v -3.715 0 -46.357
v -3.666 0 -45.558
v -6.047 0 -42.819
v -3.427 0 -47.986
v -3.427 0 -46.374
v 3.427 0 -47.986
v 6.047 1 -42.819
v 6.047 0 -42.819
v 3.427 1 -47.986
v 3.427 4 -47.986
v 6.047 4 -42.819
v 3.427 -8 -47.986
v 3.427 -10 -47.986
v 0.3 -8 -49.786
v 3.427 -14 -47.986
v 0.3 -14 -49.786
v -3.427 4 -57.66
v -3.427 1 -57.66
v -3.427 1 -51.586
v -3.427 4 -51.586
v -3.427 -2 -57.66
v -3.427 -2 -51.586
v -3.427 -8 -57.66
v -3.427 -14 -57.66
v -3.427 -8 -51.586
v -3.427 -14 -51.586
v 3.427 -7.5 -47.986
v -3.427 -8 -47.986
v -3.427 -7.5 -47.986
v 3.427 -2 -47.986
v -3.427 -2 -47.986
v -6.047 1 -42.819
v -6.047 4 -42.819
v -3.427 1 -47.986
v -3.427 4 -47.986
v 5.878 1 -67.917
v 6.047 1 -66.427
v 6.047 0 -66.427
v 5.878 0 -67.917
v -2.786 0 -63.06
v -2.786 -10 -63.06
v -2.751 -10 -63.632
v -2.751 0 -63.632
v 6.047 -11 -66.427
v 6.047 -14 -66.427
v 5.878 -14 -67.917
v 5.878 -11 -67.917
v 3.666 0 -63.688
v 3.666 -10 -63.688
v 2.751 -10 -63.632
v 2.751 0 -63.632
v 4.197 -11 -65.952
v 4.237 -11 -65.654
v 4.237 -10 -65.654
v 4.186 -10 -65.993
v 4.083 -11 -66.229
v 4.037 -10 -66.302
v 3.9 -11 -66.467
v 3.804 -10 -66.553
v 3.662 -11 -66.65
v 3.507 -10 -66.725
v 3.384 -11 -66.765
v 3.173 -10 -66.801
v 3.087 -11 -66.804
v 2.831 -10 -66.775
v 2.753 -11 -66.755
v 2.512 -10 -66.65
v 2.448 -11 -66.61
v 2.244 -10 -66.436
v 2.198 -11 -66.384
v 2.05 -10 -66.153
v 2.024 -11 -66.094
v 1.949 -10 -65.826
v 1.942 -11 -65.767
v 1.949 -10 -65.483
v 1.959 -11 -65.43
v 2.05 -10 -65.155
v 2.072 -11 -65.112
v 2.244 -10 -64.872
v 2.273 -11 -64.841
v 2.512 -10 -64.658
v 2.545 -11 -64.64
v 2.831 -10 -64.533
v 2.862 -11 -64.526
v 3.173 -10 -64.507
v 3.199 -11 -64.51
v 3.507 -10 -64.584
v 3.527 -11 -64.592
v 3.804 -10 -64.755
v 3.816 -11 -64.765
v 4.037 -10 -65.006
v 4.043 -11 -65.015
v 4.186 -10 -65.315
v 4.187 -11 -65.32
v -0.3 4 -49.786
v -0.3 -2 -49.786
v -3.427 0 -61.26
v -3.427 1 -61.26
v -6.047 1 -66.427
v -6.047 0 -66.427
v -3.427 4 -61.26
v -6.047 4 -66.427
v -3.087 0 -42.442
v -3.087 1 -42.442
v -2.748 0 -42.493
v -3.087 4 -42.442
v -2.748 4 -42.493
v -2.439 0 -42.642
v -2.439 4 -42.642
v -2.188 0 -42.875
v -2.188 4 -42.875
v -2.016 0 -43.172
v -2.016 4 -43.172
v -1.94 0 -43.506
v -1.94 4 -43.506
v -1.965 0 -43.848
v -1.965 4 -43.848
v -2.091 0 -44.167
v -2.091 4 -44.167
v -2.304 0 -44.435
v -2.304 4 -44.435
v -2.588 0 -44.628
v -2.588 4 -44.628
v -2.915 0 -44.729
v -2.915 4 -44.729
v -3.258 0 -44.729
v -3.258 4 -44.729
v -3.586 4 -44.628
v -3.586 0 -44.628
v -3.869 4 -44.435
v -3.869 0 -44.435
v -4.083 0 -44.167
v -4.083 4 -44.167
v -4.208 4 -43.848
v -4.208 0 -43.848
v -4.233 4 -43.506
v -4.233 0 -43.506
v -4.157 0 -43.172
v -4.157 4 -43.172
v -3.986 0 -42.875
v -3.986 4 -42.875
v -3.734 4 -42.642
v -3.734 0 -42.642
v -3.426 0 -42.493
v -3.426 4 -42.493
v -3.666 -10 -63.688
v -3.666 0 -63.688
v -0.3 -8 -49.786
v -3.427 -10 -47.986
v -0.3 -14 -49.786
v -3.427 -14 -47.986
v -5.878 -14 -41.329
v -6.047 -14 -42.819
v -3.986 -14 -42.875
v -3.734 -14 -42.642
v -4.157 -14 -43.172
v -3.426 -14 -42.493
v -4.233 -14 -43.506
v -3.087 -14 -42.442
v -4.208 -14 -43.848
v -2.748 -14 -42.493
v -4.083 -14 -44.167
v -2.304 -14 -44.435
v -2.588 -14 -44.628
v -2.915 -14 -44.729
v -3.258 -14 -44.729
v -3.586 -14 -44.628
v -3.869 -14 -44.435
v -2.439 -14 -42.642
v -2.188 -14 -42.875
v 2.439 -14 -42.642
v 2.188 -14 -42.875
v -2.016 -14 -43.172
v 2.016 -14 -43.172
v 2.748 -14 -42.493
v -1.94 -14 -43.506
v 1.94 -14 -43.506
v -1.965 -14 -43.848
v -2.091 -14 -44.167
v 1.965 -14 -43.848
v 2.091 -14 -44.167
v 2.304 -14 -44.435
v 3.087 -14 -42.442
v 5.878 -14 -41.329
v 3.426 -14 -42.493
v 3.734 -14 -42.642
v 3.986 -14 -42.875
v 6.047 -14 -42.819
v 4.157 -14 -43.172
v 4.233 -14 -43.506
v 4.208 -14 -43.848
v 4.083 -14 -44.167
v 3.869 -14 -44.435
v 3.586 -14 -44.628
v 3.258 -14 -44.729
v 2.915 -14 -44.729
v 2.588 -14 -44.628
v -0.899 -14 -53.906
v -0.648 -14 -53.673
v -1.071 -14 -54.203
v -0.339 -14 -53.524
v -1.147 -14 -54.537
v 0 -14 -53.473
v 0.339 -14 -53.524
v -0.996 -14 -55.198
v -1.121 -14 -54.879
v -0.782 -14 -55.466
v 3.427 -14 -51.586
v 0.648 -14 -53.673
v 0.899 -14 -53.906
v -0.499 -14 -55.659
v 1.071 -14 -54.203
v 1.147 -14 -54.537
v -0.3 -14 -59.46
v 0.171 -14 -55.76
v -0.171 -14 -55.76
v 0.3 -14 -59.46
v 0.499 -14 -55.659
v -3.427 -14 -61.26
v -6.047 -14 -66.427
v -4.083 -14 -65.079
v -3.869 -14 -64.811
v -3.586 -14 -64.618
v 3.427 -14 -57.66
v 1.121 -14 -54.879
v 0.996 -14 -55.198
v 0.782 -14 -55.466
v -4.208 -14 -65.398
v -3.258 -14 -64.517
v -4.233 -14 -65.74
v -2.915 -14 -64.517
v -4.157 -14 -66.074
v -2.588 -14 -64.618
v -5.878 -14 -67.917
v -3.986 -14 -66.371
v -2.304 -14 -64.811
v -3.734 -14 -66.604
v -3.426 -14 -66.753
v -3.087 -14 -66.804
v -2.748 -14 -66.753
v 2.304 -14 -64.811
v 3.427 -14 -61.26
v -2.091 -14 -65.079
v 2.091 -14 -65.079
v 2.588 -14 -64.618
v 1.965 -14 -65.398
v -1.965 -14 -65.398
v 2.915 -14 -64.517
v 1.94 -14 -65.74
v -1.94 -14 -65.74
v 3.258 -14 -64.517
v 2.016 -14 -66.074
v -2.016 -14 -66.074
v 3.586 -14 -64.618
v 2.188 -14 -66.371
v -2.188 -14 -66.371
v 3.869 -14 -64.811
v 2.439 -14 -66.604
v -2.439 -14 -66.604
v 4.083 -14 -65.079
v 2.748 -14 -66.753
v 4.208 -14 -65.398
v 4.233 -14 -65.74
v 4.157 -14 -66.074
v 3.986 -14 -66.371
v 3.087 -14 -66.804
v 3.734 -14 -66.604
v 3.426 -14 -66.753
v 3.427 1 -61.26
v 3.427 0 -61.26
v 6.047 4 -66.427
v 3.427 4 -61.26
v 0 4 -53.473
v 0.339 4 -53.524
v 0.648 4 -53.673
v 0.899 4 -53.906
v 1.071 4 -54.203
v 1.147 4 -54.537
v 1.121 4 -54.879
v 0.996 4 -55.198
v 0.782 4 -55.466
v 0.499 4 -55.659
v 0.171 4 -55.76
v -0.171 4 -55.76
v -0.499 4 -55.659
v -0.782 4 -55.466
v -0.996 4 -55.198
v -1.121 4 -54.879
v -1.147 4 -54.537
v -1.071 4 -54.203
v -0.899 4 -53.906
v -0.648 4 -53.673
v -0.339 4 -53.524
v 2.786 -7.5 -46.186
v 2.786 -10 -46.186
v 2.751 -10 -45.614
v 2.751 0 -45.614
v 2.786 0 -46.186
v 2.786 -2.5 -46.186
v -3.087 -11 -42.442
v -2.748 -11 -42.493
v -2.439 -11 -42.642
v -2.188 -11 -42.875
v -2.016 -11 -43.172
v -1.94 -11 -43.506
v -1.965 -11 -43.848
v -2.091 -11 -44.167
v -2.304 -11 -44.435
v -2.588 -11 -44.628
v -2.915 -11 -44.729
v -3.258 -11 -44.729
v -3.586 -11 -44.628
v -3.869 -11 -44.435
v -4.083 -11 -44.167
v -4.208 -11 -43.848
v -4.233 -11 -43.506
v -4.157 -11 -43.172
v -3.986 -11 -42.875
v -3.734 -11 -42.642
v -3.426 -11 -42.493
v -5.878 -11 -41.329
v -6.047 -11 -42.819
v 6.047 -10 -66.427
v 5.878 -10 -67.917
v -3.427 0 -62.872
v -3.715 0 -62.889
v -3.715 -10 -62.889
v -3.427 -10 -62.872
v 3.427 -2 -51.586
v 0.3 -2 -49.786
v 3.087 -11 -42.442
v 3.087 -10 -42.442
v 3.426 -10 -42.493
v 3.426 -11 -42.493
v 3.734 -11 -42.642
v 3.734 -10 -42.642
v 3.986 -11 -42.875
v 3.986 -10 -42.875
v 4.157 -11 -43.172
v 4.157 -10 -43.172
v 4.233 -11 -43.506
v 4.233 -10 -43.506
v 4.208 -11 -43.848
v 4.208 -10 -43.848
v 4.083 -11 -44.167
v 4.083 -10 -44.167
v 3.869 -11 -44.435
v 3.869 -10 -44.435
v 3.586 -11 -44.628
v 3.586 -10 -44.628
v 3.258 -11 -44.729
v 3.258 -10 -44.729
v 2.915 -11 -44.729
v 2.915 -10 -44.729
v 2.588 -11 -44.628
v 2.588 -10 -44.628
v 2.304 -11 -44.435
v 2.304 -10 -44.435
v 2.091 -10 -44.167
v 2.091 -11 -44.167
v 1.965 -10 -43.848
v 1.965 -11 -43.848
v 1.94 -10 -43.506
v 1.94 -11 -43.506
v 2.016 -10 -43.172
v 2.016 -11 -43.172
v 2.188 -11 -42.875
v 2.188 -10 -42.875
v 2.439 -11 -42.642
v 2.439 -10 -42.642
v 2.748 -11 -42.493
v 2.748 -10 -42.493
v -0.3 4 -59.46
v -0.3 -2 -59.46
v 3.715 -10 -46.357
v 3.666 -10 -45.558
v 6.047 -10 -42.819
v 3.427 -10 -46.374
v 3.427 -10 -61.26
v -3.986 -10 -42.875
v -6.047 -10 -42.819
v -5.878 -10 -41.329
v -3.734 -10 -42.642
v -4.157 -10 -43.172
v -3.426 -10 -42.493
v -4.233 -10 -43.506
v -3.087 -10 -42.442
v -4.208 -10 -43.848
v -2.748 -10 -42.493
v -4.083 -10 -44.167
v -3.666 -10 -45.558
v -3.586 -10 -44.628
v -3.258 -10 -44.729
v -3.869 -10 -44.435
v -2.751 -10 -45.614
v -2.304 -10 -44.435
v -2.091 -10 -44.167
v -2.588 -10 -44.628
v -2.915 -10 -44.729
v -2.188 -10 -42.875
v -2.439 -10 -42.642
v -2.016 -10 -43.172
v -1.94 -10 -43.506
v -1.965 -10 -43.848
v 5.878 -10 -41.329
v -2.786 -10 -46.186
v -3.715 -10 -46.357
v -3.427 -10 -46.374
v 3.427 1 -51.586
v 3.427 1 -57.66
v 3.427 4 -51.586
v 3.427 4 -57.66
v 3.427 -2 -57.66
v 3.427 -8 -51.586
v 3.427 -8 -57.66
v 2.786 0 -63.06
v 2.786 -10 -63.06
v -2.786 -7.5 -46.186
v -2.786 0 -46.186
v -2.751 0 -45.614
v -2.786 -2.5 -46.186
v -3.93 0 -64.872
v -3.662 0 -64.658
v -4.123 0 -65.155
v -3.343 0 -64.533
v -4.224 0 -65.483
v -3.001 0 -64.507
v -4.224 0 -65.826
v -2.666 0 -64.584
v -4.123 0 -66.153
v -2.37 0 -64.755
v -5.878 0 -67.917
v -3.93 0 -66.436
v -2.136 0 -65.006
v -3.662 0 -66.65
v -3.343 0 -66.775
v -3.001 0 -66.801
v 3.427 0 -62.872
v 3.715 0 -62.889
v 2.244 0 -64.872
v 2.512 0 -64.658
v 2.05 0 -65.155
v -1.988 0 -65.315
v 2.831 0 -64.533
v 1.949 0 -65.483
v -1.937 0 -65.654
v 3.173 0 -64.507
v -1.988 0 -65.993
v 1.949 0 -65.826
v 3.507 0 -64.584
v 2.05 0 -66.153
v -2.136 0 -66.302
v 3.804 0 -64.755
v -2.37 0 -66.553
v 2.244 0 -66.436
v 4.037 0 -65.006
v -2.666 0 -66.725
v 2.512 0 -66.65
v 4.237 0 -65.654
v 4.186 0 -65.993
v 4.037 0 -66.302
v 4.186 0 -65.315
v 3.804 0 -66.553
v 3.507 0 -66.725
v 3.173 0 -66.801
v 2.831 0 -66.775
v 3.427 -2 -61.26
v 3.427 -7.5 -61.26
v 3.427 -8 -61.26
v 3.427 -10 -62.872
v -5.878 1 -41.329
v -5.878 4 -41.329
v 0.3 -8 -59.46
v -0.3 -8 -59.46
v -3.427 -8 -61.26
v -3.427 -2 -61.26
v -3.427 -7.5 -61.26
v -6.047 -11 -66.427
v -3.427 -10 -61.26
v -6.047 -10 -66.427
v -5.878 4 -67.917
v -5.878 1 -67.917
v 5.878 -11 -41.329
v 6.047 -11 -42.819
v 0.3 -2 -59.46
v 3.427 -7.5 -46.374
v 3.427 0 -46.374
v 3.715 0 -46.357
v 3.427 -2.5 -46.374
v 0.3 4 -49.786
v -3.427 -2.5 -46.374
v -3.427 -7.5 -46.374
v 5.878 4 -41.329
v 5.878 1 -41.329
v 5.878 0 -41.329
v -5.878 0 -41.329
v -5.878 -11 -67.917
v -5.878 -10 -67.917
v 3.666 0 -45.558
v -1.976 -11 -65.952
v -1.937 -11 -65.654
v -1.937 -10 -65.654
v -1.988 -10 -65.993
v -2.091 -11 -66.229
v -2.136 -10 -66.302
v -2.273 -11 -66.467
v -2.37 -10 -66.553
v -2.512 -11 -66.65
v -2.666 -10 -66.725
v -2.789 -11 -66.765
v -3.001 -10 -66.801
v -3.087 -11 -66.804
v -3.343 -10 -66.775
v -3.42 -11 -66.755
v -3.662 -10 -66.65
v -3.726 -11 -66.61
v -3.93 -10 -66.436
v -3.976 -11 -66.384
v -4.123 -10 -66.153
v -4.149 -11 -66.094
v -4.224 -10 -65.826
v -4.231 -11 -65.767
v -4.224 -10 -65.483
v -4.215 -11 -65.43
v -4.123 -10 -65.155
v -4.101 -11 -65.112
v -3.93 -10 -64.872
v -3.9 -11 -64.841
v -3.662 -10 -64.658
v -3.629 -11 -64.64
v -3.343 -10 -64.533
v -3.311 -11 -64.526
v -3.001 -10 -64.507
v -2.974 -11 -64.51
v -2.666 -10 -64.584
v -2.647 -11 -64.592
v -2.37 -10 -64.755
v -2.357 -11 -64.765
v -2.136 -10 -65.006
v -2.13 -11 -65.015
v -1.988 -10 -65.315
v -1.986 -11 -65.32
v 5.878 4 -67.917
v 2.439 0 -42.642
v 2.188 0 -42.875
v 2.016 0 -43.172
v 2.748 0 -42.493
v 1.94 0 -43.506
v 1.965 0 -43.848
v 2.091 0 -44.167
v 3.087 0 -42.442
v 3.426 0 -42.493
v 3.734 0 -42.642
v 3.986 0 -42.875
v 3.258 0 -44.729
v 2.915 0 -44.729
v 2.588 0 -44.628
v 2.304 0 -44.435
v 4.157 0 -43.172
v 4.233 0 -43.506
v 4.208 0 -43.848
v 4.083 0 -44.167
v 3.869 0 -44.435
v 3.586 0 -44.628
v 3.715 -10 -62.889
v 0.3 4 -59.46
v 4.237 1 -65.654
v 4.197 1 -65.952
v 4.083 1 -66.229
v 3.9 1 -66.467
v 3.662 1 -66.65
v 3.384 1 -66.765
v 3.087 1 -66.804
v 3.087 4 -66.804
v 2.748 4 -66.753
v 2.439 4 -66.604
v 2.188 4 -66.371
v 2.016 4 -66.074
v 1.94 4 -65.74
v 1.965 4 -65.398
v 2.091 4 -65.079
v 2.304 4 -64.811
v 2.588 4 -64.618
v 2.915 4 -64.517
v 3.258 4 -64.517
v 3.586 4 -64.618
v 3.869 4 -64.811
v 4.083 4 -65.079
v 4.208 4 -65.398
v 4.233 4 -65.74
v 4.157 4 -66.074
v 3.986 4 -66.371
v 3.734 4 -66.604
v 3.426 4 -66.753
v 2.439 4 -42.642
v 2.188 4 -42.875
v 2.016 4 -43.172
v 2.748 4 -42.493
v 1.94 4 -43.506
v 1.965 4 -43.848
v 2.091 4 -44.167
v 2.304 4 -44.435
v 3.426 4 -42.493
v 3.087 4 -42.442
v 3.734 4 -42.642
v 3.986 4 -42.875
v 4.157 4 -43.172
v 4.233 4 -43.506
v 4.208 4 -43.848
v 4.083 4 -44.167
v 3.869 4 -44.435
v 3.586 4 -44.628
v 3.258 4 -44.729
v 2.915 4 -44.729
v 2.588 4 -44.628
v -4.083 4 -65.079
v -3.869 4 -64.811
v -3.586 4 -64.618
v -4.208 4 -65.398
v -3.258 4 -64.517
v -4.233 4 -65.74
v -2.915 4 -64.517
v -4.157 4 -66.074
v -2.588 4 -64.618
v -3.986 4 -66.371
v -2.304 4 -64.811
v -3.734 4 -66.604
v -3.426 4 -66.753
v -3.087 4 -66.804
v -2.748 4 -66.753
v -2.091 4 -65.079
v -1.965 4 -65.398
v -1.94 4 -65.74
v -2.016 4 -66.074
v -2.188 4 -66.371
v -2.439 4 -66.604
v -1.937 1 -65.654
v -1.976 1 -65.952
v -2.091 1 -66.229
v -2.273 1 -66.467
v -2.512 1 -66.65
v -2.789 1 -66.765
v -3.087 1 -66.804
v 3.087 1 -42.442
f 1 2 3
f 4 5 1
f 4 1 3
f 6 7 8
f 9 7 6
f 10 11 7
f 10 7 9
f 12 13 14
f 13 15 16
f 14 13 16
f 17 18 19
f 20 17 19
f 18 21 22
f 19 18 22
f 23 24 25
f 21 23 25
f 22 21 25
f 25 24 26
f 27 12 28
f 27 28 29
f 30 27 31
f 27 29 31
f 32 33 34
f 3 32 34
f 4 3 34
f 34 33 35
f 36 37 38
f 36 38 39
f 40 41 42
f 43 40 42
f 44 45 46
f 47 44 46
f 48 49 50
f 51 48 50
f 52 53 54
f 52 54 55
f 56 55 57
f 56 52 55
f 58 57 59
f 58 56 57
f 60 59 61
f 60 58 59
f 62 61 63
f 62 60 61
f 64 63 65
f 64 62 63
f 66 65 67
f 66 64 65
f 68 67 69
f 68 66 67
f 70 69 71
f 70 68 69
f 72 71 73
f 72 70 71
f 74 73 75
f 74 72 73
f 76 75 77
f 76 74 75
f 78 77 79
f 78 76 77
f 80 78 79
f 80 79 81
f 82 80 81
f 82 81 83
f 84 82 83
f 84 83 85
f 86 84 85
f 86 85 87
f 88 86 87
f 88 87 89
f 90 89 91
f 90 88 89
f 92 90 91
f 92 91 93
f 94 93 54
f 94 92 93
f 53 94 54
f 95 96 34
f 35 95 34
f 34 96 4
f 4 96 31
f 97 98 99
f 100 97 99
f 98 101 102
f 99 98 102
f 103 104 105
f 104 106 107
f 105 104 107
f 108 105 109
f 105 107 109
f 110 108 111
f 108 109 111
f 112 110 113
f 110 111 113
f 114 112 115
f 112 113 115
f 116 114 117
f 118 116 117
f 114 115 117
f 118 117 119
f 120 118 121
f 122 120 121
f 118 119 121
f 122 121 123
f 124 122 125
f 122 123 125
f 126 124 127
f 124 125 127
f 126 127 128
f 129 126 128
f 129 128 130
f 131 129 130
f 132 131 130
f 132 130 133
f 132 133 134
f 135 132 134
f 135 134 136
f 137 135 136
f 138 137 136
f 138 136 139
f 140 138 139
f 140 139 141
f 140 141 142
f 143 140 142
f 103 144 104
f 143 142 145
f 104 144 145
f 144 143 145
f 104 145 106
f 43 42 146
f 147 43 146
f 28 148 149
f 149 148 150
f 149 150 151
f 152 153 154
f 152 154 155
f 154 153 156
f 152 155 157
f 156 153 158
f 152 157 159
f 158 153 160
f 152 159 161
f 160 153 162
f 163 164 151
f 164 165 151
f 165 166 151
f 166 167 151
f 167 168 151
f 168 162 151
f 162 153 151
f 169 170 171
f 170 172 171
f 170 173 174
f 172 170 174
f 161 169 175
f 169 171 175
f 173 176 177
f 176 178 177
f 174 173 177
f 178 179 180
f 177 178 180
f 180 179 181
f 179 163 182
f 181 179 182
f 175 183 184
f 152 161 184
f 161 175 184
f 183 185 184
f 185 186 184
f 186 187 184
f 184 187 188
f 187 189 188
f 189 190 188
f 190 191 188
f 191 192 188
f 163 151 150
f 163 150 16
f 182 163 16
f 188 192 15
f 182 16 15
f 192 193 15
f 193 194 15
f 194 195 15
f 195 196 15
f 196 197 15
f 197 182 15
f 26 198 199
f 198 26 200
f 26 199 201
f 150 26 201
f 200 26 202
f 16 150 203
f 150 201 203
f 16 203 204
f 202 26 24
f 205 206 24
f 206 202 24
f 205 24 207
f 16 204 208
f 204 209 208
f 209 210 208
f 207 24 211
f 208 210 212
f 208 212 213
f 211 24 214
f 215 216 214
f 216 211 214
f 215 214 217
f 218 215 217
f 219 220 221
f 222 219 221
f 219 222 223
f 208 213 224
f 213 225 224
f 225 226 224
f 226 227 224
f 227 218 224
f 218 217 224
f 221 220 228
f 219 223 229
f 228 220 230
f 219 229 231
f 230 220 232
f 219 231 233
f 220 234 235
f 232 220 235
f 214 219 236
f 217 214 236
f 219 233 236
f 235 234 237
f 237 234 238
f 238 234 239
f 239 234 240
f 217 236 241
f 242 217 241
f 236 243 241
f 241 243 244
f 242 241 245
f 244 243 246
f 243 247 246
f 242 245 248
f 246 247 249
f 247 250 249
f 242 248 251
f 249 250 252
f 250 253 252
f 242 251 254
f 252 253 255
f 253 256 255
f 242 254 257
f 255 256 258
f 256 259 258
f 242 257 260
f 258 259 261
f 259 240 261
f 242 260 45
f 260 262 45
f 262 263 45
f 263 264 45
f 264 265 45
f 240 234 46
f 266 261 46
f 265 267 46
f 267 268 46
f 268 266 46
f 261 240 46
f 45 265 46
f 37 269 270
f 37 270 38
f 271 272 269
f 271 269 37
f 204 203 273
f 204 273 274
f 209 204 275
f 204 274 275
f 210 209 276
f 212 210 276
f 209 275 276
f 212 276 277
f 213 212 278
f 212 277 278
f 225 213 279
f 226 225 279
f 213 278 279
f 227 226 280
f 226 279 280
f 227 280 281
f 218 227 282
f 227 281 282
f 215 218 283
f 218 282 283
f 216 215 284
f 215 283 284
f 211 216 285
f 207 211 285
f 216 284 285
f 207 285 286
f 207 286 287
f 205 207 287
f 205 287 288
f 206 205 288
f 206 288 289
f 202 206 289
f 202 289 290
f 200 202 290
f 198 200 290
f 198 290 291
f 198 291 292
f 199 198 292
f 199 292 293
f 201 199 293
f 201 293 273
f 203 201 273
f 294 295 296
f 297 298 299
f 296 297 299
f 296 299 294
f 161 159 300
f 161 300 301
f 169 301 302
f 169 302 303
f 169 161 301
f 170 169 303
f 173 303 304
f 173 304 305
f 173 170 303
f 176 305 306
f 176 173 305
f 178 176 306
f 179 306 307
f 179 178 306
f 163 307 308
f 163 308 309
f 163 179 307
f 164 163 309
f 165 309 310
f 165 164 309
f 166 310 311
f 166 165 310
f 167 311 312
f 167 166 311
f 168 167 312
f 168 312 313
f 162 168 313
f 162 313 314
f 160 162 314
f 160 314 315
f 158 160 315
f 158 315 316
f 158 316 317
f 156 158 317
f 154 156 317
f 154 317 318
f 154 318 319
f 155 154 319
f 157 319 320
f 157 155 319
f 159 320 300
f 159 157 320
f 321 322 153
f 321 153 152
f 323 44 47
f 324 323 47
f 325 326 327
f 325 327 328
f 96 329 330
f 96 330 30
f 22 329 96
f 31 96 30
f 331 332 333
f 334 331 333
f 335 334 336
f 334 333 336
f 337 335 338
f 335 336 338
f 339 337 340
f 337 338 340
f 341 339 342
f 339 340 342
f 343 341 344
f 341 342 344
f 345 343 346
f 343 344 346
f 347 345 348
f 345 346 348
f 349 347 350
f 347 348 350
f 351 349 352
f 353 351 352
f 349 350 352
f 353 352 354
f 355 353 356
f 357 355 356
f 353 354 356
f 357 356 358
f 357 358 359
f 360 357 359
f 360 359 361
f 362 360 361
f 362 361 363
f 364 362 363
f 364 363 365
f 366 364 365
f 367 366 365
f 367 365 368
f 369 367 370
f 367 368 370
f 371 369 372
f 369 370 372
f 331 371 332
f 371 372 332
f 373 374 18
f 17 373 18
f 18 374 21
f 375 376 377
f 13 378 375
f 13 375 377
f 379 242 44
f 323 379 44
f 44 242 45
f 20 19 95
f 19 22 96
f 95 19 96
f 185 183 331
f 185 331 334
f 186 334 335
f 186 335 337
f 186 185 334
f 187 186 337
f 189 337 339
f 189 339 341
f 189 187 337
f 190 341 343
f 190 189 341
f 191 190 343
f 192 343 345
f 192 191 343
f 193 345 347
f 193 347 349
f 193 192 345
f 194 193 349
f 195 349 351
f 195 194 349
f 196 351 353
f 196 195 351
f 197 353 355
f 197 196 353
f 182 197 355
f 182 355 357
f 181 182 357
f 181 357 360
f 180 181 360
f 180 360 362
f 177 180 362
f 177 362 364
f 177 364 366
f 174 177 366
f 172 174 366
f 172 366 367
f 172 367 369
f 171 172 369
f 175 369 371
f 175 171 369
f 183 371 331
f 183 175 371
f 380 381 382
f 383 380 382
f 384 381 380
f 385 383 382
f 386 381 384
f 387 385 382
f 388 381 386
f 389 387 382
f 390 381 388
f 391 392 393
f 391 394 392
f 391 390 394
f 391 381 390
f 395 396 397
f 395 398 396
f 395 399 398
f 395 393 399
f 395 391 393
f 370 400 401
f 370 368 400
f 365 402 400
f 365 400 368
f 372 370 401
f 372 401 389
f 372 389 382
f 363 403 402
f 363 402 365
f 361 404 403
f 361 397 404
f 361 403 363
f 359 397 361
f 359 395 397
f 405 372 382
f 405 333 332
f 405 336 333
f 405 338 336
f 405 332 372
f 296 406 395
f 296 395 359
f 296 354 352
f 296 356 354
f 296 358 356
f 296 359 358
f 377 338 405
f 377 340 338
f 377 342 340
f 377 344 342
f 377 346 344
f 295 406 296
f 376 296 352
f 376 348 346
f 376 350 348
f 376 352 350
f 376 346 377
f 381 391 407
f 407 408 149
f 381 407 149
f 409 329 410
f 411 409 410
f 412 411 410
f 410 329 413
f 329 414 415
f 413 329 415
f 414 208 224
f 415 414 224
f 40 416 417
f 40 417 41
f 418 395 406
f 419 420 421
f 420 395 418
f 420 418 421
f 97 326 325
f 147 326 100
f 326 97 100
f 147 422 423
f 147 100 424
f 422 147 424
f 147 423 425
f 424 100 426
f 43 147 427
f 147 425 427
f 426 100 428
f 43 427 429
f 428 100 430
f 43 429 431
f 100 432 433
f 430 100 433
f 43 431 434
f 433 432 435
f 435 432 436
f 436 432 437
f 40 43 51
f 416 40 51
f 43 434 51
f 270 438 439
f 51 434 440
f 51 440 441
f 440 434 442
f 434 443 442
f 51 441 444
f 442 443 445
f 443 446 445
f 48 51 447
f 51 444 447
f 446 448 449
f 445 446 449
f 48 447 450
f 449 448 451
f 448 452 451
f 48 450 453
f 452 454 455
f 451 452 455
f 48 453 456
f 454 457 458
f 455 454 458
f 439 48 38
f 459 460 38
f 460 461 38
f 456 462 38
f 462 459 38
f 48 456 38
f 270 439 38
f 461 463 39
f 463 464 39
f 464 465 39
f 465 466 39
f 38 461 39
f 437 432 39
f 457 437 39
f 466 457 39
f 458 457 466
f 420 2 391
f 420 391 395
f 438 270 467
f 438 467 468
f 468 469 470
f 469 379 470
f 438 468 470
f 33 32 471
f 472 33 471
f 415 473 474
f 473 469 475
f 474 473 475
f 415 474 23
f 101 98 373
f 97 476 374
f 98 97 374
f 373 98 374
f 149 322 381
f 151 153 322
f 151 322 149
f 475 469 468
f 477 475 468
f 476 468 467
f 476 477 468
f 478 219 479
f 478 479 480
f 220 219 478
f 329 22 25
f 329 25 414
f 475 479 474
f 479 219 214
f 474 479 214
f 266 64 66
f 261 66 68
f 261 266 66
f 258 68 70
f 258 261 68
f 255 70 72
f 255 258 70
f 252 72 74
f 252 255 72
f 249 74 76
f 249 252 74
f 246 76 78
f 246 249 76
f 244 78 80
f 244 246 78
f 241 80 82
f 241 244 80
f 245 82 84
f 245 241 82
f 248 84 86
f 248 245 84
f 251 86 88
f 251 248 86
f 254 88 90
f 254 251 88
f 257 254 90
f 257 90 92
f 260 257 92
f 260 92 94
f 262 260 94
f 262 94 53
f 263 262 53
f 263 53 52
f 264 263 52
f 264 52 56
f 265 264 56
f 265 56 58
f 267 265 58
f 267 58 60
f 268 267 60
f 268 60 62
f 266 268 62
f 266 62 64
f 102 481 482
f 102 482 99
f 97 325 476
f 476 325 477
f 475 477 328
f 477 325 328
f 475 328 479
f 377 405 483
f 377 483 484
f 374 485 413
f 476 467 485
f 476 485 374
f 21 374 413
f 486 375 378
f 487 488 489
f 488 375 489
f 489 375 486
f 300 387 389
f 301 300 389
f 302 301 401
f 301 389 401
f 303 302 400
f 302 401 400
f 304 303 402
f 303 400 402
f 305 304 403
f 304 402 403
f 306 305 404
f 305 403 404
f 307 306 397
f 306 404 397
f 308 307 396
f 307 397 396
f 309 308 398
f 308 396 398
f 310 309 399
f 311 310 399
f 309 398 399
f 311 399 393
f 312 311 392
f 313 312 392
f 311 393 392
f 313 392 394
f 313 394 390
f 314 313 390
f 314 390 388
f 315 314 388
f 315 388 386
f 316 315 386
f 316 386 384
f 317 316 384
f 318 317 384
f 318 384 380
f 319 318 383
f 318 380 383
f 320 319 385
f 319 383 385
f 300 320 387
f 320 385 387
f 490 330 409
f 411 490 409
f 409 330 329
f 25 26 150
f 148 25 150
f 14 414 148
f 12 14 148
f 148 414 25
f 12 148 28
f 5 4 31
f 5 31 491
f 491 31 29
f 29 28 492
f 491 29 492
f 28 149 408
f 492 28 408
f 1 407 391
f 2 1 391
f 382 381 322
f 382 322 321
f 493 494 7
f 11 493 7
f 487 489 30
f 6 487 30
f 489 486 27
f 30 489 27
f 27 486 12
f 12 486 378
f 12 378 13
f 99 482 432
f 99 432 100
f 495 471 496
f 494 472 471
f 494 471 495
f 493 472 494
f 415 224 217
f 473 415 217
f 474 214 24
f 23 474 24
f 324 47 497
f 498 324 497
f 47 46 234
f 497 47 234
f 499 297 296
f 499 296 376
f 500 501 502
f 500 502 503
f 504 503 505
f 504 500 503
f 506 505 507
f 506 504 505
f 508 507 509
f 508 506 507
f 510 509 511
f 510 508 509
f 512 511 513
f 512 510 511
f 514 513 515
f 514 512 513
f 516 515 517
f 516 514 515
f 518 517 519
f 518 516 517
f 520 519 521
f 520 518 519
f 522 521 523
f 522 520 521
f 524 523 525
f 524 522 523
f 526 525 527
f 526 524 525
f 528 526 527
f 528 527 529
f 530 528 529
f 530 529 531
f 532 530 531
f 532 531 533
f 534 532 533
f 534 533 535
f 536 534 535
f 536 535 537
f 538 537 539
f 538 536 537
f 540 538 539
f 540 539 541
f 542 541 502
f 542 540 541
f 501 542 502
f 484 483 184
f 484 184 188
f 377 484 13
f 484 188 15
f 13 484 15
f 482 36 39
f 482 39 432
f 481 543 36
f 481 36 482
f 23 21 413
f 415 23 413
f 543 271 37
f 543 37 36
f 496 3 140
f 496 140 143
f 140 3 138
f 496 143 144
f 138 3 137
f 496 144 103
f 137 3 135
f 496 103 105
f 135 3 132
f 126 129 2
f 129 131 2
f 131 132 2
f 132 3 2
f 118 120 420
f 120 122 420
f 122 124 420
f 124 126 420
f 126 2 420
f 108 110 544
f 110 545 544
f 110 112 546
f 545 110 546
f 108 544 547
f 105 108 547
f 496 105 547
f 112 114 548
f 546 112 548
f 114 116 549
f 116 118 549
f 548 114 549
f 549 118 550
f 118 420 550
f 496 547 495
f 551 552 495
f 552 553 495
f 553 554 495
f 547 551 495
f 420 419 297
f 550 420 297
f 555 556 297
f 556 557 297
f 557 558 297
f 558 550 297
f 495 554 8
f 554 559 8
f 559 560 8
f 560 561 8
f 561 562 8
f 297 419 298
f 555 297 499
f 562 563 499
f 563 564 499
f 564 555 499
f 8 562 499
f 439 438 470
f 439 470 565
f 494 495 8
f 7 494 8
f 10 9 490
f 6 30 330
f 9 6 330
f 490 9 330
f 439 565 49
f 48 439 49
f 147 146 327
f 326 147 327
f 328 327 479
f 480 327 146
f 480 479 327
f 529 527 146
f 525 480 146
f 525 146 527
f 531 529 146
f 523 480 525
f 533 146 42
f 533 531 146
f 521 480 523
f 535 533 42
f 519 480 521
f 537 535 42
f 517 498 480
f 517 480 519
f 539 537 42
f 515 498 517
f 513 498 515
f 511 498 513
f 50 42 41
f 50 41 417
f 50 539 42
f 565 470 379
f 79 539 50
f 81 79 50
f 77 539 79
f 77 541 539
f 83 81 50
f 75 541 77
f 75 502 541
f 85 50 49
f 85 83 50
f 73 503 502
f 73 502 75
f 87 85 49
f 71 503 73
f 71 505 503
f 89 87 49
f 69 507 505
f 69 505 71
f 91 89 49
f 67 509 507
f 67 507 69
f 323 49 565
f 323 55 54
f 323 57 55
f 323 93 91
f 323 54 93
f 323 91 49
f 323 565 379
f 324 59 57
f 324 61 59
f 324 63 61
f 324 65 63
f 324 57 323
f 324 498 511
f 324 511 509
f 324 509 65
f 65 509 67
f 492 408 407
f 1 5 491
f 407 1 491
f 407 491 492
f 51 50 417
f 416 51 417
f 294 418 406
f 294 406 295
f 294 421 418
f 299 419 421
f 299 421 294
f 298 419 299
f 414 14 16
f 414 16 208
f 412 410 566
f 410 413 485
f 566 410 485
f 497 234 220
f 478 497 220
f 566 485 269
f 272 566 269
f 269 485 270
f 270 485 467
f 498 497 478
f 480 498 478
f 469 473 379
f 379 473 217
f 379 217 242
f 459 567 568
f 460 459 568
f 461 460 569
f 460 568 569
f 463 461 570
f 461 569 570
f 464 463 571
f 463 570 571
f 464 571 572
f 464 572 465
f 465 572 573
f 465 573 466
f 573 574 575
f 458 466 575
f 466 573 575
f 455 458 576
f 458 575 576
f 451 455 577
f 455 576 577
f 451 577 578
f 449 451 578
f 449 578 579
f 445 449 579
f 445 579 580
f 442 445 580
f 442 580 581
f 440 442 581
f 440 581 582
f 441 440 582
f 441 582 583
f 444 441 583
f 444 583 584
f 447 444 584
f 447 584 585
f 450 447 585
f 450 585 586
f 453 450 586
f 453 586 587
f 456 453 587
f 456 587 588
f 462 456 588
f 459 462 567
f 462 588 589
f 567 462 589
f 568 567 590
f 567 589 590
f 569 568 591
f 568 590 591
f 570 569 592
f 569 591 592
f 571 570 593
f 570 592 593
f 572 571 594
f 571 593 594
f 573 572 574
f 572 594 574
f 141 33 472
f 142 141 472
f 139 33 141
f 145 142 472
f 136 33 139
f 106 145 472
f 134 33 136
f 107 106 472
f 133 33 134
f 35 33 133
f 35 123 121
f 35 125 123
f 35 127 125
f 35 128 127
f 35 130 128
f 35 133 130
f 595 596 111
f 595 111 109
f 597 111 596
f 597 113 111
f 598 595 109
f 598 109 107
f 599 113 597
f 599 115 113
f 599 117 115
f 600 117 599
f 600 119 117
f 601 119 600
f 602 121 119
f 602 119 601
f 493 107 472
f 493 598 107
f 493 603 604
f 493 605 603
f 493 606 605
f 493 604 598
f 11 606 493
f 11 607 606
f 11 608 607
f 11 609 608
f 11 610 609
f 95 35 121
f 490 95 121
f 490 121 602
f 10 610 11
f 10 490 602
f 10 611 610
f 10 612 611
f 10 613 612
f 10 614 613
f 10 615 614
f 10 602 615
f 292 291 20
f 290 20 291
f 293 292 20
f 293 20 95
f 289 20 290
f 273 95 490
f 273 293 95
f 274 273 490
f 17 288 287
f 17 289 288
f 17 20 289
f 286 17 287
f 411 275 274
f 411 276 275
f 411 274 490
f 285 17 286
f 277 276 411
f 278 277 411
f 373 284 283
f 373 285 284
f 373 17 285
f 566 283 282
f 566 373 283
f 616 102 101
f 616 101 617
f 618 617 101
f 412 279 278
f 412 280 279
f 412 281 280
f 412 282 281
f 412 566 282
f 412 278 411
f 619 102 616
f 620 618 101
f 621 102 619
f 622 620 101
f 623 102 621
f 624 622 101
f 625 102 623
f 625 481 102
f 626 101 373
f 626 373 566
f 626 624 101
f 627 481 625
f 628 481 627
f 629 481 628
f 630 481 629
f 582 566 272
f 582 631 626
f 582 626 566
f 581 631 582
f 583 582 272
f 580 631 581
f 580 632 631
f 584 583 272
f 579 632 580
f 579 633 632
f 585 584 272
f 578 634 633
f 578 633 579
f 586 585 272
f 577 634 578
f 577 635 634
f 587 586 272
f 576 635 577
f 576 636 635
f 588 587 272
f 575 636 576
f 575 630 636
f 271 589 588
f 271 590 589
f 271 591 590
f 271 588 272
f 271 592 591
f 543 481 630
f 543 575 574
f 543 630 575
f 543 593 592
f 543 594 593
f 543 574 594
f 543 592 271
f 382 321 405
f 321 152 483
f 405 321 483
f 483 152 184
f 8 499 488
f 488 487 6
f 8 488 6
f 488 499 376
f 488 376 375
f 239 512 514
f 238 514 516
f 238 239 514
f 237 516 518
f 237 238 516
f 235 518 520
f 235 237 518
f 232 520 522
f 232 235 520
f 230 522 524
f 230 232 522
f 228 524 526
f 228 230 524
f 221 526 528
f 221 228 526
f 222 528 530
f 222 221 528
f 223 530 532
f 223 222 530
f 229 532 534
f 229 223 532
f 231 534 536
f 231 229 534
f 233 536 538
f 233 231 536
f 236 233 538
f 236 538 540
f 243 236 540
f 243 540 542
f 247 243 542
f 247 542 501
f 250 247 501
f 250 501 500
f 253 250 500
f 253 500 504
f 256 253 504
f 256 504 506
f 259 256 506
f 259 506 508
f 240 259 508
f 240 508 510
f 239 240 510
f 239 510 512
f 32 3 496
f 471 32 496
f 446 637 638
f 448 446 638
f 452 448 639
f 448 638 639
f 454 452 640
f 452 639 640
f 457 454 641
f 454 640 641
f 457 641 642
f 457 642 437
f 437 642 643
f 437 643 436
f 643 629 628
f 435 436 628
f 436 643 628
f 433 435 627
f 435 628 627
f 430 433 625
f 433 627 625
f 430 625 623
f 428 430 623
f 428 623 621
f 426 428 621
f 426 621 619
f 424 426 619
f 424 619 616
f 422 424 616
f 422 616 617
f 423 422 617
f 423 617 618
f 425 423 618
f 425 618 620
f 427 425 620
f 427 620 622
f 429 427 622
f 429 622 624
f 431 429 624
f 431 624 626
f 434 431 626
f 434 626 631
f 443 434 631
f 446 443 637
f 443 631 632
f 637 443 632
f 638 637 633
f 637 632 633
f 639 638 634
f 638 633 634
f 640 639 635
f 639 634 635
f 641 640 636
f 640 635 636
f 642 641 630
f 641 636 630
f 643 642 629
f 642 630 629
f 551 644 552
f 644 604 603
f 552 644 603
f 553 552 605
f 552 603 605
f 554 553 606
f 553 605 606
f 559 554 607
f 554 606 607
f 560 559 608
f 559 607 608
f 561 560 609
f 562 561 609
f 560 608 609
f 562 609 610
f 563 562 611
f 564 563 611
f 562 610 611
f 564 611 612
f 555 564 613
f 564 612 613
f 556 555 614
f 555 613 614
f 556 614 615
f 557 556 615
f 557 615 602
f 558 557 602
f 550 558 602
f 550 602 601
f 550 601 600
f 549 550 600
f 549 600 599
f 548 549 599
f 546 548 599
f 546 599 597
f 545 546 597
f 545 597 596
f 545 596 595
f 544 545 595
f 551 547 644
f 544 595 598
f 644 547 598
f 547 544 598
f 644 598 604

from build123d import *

# Parameters (mm, degrees)
SKETCH1_R            = 1.15
BOSS_EXTRUDE1_DEPTH  = 1
BOSS_EXTRUDE2_DEPTH  = 12
BOSS_EXTRUDE3_DEPTH  = 12
SKETCH6_W            = 6.853919328
SKETCH6_H            = 5
BOSS_EXTRUDE4_DEPTH  = 10
MIRROR2_START        = -11
MIRROR2_OUTLINE_R    = 1.15
MIRROR2_DEPTH        = 1
MIRROR2_START_2      = -10
MIRROR2_2_DEPTH      = 11
SKETCH7_W            = 11.75623079
SKETCH7_H            = 5.445993007
CUT_EXTRUDE1_DEPTH   = 22
SKETCH15_W           = 6.853919328
SKETCH15_H           = 5
BOSS_EXTRUDE8_DEPTH  = 6.873966159
CUT_EXTRUDE6_DEPTH   = 10
BOSS_EXTRUDE9_DEPTH  = 3.5
SKETCH19_R           = 1.15
CUT_EXTRUDE2_DEPTH   = 20
BOSS_EXTRUDE10_DEPTH = 1
BOSS_EXTRUDE11_START = 3
SKETCH27_R           = 1.15
BOSS_EXTRUDE11_DEPTH = 3
SKETCH28_W           = 13.273966158
SKETCH28_H           = 6
CUT_EXTRUDE7_DEPTH   = 13
SKETCH29_W           = 6.853919328
SKETCH29_H           = 6.073966158
SKETCH29_R           = 1.15
BOSS_EXTRUDE12_DEPTH = 13
BOSS_EXTRUDE13_DEPTH = 4


with BuildPart() as part:
    # Sketch1 → Boss-Extrude1 (new body)
    with BuildSketch(Plane(origin=(0, 0, 0), x_dir=(1, 0, 0), z_dir=(0, 1, 0))):
        Polygon((-6.046966624, 49.693438145), (-5.709264166, 46.7123956), (-3.10834847, 44.45145408), (-2.33209021, 44.498932069), (-0.026100804, 47.059992762), (0.026100804, 47.059992762), (2.33209021, 44.498932069), (3.10834847, 44.45145408), (5.709264166, 46.7123956), (6.046966624, 49.693438145), (3.66640026, 52.431966482), (2.75077786, 52.487968347), (0.054213226, 50.059970644), (-0.054213226, 50.059970644), (-2.75077786, 52.487968347), (-3.66640026, 52.431966482), align=None)
        with Locations(Location((-3.086614159, 50.465695408, 0), (0, 0, 270))):
            Circle(SKETCH1_R, mode=Mode.SUBTRACT)
        with Locations(Location((3.086614159, 50.465695408, 0), (0, 0, 270))):
            Circle(SKETCH1_R, mode=Mode.SUBTRACT)
        with Locations(Location((2.842648162, 46.476886618, 0), (0, 0, 270))):
            Circle(SKETCH1_R, mode=Mode.SUBTRACT)
        with Locations(Location((-2.842648162, 46.476886618, 0), (0, 0, 270))):
            Circle(SKETCH1_R, mode=Mode.SUBTRACT)
    boss_extrude1 = extrude(amount=BOSS_EXTRUDE1_DEPTH)

    # Sketch2 → Boss-Extrude2 (add)
    with BuildSketch(Plane(origin=(0, 1, 0), x_dir=(1, 0, 0), z_dir=(0, 1, 0))):
        Polygon((-3.66640026, 52.431966482), (-2.75077786, 52.487968347), (-2.799616692, 53.286476185), (-3.715239092, 53.23047432), align=None)
        Polygon((2.75077786, 52.487968347), (3.66640026, 52.431966482), (3.715239092, 53.23047432), (2.799616692, 53.286476185), align=None)
    extrude(amount=-BOSS_EXTRUDE2_DEPTH)

    # Mirror1: Boss-Extrude1 across plane
    add(boss_extrude1.mirror(Plane.ZX.offset(-5)))

    # Sketch3 → Boss-Extrude3 (add)
    with BuildSketch(Plane(origin=(0, 1, 0), x_dir=(1, 0, 0), z_dir=(0, 1, 0))):
        Polygon((2.33209021, 44.498932069), (3.10834847, 44.45145408), (3.059509638, 43.652946241), (2.283251379, 43.70042423), align=None)
        Polygon((-2.33209021, 44.498932069), (-3.10834847, 44.45145408), (-3.059509638, 43.652946241), (-2.283251379, 43.70042423), align=None)
    extrude(amount=-BOSS_EXTRUDE3_DEPTH)

    # Sketch6 → Boss-Extrude4 (add)
    with BuildSketch(Plane(origin=(0, 0, -53.059970644), x_dir=(-1, 0, 0), z_dir=(0, 0, -1))):
        with Locations((0, -5)):
            Rectangle(SKETCH6_W, SKETCH6_H)
    extrude(amount=BOSS_EXTRUDE4_DEPTH)



with BuildPart() as body_2:
    # Mirror2: read off the stored shape, not the designer's step
    # Mirror2 outline → Mirror2 (new body)
    with BuildSketch(Plane(origin=(0, 0, 0), x_dir=(1, 0, 0), z_dir=(0, 1, 0)).offset(MIRROR2_START)):
        Polygon((-3.715239092, 62.889466969), (-2.799616692, 62.833465104), (-2.75077786, 63.631972942), (-0.054213226, 66.059970644), (0.054213226, 66.059970644), (2.75077786, 63.631972942), (2.799616692, 62.833465104), (3.715239092, 62.889466969), (3.66640026, 63.687974807), (6.046966624, 66.426503144), (5.709264166, 69.407545689), (3.10834847, 71.668487209), (3.059509638, 72.466995048), (2.283251379, 72.419517059), (2.33209021, 71.62100922), (0.026100804, 69.059948527), (-0.026100804, 69.059948527), (-2.33209021, 71.62100922), (-2.283251379, 72.419517059), (-3.059509638, 72.466995048), (-3.10834847, 71.668487209), (-5.709264166, 69.407545689), (-6.046966624, 66.426503144), (-3.66640026, 63.687974807), align=None)
        with Locations((2.842648162, 69.643054671)):
            Circle(MIRROR2_OUTLINE_R, mode=Mode.SUBTRACT)
        with Locations((-3.086614159, 65.654245881)):
            Circle(MIRROR2_OUTLINE_R, mode=Mode.SUBTRACT)
        with Locations((3.086614159, 65.654245881)):
            Circle(MIRROR2_OUTLINE_R, mode=Mode.SUBTRACT)
        with Locations((-2.842648162, 69.643054671)):
            Circle(MIRROR2_OUTLINE_R, mode=Mode.SUBTRACT)
    mirror2 = extrude(amount=MIRROR2_DEPTH)


with BuildPart() as part_1:
    add(part.part)

    add(body_2.part)  # Mirror2 2 merges body 2
    # Mirror2 2 outline → Mirror2 2 (add)
    with BuildSketch(Plane(origin=(0, 0, 0), x_dir=(1, 0, 0), z_dir=(0, 1, 0)).offset(MIRROR2_START_2)):
        Polygon((-3.715239092, 62.889466969), (-2.799616692, 62.833465104), (-2.75077786, 63.631972942), (-3.66640026, 63.687974807), align=None)
        Polygon((3.66640026, 63.687974807), (2.75077786, 63.631972942), (2.799616692, 62.833465104), (3.715239092, 62.889466969), align=None)
        Polygon((-3.059509638, 72.466995048), (-3.10834847, 71.668487209), (-2.33209021, 71.62100922), (-2.283251379, 72.419517059), align=None)
        Polygon((2.33209021, 71.62100922), (3.10834847, 71.668487209), (3.059509638, 72.466995048), (2.283251379, 72.419517059), align=None)
    mirror2_2 = extrude(amount=MIRROR2_2_DEPTH)

    # Mirror3: Mirror2, Mirror2 2 across plane
    add(mirror2.mirror(Plane.ZX.offset(-5)))
    add(mirror2_2.mirror(Plane.ZX.offset(-5)))

    # Sketch7 → Cut-Extrude1 (cut)
    with BuildSketch(Plane.XZ.offset(11)):
        with Locations((0, -45.479920369)):
            Rectangle(SKETCH7_W, SKETCH7_H)
    cut_extrude1 = extrude(amount=-CUT_EXTRUDE1_DEPTH, mode=Mode.SUBTRACT)

    # Mirror4: Cut-Extrude1 across plane
    add(cut_extrude1.mirror(Plane.XY.offset(-58.059970644)), mode=Mode.SUBTRACT)


with BuildPart() as body_2_2:
    # Split1: the piece on the far side of the plane
    add(part_1.part)
    split(bisect_by=Plane.XY.offset(-58.059970644), keep=Keep.BOTTOM)


with BuildPart() as part_2:
    add(part_1.part)

    # Split1
    split(bisect_by=Plane.XY.offset(-58.059970644), keep=Keep.TOP)


with BuildPart() as part_3:
    # Body-Move/Copy1: moved
    add(part_2.part.moved(Location((0, 0, 6.873966159))))


with BuildPart() as part_4:
    # Body-Move/Copy2: moved
    add(part_3.part.moved(Location((20.680073688, 0, 0))))


with BuildPart() as part_5:
    # Body-Move/Copy4: read off the stored shape, not the designer's step
    # Body-Move/Copy4: moved
    add(part_4.part.moved(Location((-20.6800737, 0, 0))))


    add(body_2_2.part)  # Boss-Extrude8 merges body 2 2
    # Sketch15 → Boss-Extrude8 (add)
    with BuildSketch(Plane.XY.offset(-58.059970644)):
        with Locations((0, -5)):
            Rectangle(SKETCH15_W, SKETCH15_H)
    extrude(amount=BOSS_EXTRUDE8_DEPTH)

    # Sketch24 → Cut-Extrude6 (cut)
    with BuildSketch(Plane(origin=(0, -2.5, 0), x_dir=(1, 0, 0), z_dir=(0, 1, 0))):
        Polygon((-3.426959664, 61.259970644), (-3.426959664, 57.659970644), (-0.3, 59.459970644), align=None)
        Polygon((3.426959664, 61.259970644), (0.3, 59.459970644), (3.426959664, 57.659970644), align=None)
    cut_extrude6 = extrude(amount=-CUT_EXTRUDE6_DEPTH, mode=Mode.SUBTRACT)

    # Mirror8: Cut-Extrude6 across plane
    add(cut_extrude6.mirror(Plane.XY.offset(-54.622987565)), mode=Mode.SUBTRACT)

    # Sketch25 → Boss-Extrude9 (add)
    with BuildSketch(Plane(origin=(0, -2.5, 0), x_dir=(1, 0, 0), z_dir=(0, 1, 0))):
        Polygon((-3.426959664, 63.059970644), (-3.426959664, 61.259970644), (-0.3, 59.459970644), (-3.426959664, 57.659970644), (-3.426959664, 51.586004486), (-0.3, 49.786004486), (-3.426959664, 47.986004486), (-3.426959664, 46.186004486), (3.426959664, 46.186004486), (3.426959664, 47.986004486), (0.3, 49.786004486), (3.426959664, 51.586004486), (3.426959664, 57.659970644), (0.3, 59.459970644), (3.426959664, 61.259970644), (3.426959664, 63.059970644), align=None)
    boss_extrude9 = extrude(amount=BOSS_EXTRUDE9_DEPTH)

    # Mirror10: Boss-Extrude9 across plane
    add(boss_extrude9.mirror(Plane.ZX.offset(-5)))

    # Sketch19 → Cut-Extrude2 (cut)
    with BuildSketch(Plane(origin=(0, 1, 0), x_dir=(1, 0, 0), z_dir=(0, 1, 0))):
        with Locations(Location((0, 54.622987565, 0), (0, 0, 270))):
            Circle(SKETCH19_R)
    extrude(amount=-CUT_EXTRUDE2_DEPTH, mode=Mode.SUBTRACT)

    # Sketch26 → Boss-Extrude10 (add)
    with BuildSketch(Plane(origin=(0, 1, 0), x_dir=(1, 0, 0), z_dir=(0, 1, 0))):
        Polygon((-0.054213226, 66.059970644), (0.054213226, 66.059970644), (2.75077786, 63.631972942), (2.785763019, 63.059970644), (-2.785763019, 63.059970644), (-2.75077786, 63.631972942), align=None)
        Polygon((-2.785763019, 46.186004486), (2.785763019, 46.186004486), (2.75077786, 45.614002188), (0.054213226, 43.186004486), (-0.054213226, 43.186004486), (-2.75077786, 45.614002188), align=None)
    boss_extrude10 = extrude(amount=-BOSS_EXTRUDE10_DEPTH)

    # Mirror11: Boss-Extrude10 across plane
    add(boss_extrude10.mirror(Plane.ZX.offset(-5)))

    # Sketch27 → Boss-Extrude11 (add)
    with BuildSketch(Plane(origin=(0, 1, 0), x_dir=(1, 0, 0), z_dir=(0, 1, 0)).offset(BOSS_EXTRUDE11_START)):
        Polygon((-5.878115395, 67.917024417), (-6.046966624, 66.426503144), (-3.66640026, 63.687974807), (-3.715239092, 62.889466969), (-3.426959664, 62.871835043), (-3.426959664, 61.259970644), (-0.3, 59.459970644), (-3.426959664, 57.659970644), (-3.426959664, 51.586004486), (-0.3, 49.786004486), (-3.426959664, 47.986004486), (-3.426959664, 46.374140087), (-3.715239092, 46.356508162), (-3.66640026, 45.558000323), (-6.046966624, 42.819471986), (-5.878115395, 41.328950714), (5.878115395, 41.328950714), (6.046966624, 42.819471986), (3.66640026, 45.558000323), (3.715239092, 46.356508162), (3.426959664, 46.374140087), (3.426959664, 47.986004486), (0.3, 49.786004486), (3.426959664, 51.586004486), (3.426959664, 57.659970644), (0.3, 59.459970644), (3.426959664, 61.259970644), (3.426959664, 62.871835043), (3.715239092, 62.889466969), (3.66640026, 63.687974807), (6.046966624, 66.426503144), (5.878115395, 67.917024417), align=None)
        with Locations(Location((-3.086614159, 65.654245881, 0), (0, 0, 90))):
            Circle(SKETCH27_R, mode=Mode.SUBTRACT)
        with Locations(Location((3.086614159, 65.654245881, 0), (0, 0, 90))):
            Circle(SKETCH27_R, mode=Mode.SUBTRACT)
        with Locations(Location((0, 54.622987565, 0), (0, 0, 270))):
            Circle(SKETCH27_R, mode=Mode.SUBTRACT)
        with Locations(Location((-3.086614159, 43.59172925, 0), (0, 0, 270))):
            Circle(SKETCH27_R, mode=Mode.SUBTRACT)
        with Locations(Location((3.086614159, 43.59172925, 0), (0, 0, 270))):
            Circle(SKETCH27_R, mode=Mode.SUBTRACT)
    boss_extrude11 = extrude(amount=-BOSS_EXTRUDE11_DEPTH)

    # Mirror12: Boss-Extrude11 across plane
    add(boss_extrude11.mirror(Plane.ZX.offset(-5)))

    # Sketch28 → Cut-Extrude7 (cut)
    with BuildSketch(Plane.ZY.offset(3.426959664)):
        with Locations((-54.622987565, -5)):
            Rectangle(SKETCH28_W, SKETCH28_H)
    extrude(amount=-CUT_EXTRUDE7_DEPTH, mode=Mode.SUBTRACT)

    # Sketch29 → Boss-Extrude12 (add)
    with BuildSketch(Plane(origin=(0, 4, 0), x_dir=(1, 0, 0), z_dir=(0, 1, 0))):
        with Locations((0, 54.622987565)):
            Rectangle(SKETCH29_W, SKETCH29_H)
        with Locations(Location((0, 54.622987565, 0), (0, 0, 270))):
            Circle(SKETCH29_R, mode=Mode.SUBTRACT)
    extrude(amount=-BOSS_EXTRUDE12_DEPTH)

    # Sketch30 → Boss-Extrude13 (add)
    with BuildSketch(Plane(origin=(0, 4, 0), x_dir=(1, 0, 0), z_dir=(0, 1, 0))):
        Polygon((3.426959664, 61.259970644), (6.046966624, 66.426503144), (3.66640026, 63.687974807), (3.715239092, 62.889466969), (3.426959664, 62.871835043), align=None)
        Polygon((-6.046966624, 66.426503144), (-3.66640026, 63.687974807), (-3.715239092, 62.889466969), (-3.426959664, 62.871835043), (-3.426959664, 61.259970644), align=None)
        Polygon((3.426959664, 47.986004486), (3.426959664, 46.374140087), (3.715239092, 46.356508162), (3.66640026, 45.558000323), (6.046966624, 42.819471986), align=None)
        Polygon((-3.426959664, 47.986004486), (-3.426959664, 46.374140087), (-3.715239092, 46.356508162), (-3.66640026, 45.558000323), (-6.046966624, 42.819471986), align=None)
    boss_extrude13 = extrude(amount=-BOSS_EXTRUDE13_DEPTH)

    # Mirror13: Boss-Extrude13 across plane
    add(boss_extrude13.mirror(Plane.ZX.offset(-5)))


solid = part_5.part
